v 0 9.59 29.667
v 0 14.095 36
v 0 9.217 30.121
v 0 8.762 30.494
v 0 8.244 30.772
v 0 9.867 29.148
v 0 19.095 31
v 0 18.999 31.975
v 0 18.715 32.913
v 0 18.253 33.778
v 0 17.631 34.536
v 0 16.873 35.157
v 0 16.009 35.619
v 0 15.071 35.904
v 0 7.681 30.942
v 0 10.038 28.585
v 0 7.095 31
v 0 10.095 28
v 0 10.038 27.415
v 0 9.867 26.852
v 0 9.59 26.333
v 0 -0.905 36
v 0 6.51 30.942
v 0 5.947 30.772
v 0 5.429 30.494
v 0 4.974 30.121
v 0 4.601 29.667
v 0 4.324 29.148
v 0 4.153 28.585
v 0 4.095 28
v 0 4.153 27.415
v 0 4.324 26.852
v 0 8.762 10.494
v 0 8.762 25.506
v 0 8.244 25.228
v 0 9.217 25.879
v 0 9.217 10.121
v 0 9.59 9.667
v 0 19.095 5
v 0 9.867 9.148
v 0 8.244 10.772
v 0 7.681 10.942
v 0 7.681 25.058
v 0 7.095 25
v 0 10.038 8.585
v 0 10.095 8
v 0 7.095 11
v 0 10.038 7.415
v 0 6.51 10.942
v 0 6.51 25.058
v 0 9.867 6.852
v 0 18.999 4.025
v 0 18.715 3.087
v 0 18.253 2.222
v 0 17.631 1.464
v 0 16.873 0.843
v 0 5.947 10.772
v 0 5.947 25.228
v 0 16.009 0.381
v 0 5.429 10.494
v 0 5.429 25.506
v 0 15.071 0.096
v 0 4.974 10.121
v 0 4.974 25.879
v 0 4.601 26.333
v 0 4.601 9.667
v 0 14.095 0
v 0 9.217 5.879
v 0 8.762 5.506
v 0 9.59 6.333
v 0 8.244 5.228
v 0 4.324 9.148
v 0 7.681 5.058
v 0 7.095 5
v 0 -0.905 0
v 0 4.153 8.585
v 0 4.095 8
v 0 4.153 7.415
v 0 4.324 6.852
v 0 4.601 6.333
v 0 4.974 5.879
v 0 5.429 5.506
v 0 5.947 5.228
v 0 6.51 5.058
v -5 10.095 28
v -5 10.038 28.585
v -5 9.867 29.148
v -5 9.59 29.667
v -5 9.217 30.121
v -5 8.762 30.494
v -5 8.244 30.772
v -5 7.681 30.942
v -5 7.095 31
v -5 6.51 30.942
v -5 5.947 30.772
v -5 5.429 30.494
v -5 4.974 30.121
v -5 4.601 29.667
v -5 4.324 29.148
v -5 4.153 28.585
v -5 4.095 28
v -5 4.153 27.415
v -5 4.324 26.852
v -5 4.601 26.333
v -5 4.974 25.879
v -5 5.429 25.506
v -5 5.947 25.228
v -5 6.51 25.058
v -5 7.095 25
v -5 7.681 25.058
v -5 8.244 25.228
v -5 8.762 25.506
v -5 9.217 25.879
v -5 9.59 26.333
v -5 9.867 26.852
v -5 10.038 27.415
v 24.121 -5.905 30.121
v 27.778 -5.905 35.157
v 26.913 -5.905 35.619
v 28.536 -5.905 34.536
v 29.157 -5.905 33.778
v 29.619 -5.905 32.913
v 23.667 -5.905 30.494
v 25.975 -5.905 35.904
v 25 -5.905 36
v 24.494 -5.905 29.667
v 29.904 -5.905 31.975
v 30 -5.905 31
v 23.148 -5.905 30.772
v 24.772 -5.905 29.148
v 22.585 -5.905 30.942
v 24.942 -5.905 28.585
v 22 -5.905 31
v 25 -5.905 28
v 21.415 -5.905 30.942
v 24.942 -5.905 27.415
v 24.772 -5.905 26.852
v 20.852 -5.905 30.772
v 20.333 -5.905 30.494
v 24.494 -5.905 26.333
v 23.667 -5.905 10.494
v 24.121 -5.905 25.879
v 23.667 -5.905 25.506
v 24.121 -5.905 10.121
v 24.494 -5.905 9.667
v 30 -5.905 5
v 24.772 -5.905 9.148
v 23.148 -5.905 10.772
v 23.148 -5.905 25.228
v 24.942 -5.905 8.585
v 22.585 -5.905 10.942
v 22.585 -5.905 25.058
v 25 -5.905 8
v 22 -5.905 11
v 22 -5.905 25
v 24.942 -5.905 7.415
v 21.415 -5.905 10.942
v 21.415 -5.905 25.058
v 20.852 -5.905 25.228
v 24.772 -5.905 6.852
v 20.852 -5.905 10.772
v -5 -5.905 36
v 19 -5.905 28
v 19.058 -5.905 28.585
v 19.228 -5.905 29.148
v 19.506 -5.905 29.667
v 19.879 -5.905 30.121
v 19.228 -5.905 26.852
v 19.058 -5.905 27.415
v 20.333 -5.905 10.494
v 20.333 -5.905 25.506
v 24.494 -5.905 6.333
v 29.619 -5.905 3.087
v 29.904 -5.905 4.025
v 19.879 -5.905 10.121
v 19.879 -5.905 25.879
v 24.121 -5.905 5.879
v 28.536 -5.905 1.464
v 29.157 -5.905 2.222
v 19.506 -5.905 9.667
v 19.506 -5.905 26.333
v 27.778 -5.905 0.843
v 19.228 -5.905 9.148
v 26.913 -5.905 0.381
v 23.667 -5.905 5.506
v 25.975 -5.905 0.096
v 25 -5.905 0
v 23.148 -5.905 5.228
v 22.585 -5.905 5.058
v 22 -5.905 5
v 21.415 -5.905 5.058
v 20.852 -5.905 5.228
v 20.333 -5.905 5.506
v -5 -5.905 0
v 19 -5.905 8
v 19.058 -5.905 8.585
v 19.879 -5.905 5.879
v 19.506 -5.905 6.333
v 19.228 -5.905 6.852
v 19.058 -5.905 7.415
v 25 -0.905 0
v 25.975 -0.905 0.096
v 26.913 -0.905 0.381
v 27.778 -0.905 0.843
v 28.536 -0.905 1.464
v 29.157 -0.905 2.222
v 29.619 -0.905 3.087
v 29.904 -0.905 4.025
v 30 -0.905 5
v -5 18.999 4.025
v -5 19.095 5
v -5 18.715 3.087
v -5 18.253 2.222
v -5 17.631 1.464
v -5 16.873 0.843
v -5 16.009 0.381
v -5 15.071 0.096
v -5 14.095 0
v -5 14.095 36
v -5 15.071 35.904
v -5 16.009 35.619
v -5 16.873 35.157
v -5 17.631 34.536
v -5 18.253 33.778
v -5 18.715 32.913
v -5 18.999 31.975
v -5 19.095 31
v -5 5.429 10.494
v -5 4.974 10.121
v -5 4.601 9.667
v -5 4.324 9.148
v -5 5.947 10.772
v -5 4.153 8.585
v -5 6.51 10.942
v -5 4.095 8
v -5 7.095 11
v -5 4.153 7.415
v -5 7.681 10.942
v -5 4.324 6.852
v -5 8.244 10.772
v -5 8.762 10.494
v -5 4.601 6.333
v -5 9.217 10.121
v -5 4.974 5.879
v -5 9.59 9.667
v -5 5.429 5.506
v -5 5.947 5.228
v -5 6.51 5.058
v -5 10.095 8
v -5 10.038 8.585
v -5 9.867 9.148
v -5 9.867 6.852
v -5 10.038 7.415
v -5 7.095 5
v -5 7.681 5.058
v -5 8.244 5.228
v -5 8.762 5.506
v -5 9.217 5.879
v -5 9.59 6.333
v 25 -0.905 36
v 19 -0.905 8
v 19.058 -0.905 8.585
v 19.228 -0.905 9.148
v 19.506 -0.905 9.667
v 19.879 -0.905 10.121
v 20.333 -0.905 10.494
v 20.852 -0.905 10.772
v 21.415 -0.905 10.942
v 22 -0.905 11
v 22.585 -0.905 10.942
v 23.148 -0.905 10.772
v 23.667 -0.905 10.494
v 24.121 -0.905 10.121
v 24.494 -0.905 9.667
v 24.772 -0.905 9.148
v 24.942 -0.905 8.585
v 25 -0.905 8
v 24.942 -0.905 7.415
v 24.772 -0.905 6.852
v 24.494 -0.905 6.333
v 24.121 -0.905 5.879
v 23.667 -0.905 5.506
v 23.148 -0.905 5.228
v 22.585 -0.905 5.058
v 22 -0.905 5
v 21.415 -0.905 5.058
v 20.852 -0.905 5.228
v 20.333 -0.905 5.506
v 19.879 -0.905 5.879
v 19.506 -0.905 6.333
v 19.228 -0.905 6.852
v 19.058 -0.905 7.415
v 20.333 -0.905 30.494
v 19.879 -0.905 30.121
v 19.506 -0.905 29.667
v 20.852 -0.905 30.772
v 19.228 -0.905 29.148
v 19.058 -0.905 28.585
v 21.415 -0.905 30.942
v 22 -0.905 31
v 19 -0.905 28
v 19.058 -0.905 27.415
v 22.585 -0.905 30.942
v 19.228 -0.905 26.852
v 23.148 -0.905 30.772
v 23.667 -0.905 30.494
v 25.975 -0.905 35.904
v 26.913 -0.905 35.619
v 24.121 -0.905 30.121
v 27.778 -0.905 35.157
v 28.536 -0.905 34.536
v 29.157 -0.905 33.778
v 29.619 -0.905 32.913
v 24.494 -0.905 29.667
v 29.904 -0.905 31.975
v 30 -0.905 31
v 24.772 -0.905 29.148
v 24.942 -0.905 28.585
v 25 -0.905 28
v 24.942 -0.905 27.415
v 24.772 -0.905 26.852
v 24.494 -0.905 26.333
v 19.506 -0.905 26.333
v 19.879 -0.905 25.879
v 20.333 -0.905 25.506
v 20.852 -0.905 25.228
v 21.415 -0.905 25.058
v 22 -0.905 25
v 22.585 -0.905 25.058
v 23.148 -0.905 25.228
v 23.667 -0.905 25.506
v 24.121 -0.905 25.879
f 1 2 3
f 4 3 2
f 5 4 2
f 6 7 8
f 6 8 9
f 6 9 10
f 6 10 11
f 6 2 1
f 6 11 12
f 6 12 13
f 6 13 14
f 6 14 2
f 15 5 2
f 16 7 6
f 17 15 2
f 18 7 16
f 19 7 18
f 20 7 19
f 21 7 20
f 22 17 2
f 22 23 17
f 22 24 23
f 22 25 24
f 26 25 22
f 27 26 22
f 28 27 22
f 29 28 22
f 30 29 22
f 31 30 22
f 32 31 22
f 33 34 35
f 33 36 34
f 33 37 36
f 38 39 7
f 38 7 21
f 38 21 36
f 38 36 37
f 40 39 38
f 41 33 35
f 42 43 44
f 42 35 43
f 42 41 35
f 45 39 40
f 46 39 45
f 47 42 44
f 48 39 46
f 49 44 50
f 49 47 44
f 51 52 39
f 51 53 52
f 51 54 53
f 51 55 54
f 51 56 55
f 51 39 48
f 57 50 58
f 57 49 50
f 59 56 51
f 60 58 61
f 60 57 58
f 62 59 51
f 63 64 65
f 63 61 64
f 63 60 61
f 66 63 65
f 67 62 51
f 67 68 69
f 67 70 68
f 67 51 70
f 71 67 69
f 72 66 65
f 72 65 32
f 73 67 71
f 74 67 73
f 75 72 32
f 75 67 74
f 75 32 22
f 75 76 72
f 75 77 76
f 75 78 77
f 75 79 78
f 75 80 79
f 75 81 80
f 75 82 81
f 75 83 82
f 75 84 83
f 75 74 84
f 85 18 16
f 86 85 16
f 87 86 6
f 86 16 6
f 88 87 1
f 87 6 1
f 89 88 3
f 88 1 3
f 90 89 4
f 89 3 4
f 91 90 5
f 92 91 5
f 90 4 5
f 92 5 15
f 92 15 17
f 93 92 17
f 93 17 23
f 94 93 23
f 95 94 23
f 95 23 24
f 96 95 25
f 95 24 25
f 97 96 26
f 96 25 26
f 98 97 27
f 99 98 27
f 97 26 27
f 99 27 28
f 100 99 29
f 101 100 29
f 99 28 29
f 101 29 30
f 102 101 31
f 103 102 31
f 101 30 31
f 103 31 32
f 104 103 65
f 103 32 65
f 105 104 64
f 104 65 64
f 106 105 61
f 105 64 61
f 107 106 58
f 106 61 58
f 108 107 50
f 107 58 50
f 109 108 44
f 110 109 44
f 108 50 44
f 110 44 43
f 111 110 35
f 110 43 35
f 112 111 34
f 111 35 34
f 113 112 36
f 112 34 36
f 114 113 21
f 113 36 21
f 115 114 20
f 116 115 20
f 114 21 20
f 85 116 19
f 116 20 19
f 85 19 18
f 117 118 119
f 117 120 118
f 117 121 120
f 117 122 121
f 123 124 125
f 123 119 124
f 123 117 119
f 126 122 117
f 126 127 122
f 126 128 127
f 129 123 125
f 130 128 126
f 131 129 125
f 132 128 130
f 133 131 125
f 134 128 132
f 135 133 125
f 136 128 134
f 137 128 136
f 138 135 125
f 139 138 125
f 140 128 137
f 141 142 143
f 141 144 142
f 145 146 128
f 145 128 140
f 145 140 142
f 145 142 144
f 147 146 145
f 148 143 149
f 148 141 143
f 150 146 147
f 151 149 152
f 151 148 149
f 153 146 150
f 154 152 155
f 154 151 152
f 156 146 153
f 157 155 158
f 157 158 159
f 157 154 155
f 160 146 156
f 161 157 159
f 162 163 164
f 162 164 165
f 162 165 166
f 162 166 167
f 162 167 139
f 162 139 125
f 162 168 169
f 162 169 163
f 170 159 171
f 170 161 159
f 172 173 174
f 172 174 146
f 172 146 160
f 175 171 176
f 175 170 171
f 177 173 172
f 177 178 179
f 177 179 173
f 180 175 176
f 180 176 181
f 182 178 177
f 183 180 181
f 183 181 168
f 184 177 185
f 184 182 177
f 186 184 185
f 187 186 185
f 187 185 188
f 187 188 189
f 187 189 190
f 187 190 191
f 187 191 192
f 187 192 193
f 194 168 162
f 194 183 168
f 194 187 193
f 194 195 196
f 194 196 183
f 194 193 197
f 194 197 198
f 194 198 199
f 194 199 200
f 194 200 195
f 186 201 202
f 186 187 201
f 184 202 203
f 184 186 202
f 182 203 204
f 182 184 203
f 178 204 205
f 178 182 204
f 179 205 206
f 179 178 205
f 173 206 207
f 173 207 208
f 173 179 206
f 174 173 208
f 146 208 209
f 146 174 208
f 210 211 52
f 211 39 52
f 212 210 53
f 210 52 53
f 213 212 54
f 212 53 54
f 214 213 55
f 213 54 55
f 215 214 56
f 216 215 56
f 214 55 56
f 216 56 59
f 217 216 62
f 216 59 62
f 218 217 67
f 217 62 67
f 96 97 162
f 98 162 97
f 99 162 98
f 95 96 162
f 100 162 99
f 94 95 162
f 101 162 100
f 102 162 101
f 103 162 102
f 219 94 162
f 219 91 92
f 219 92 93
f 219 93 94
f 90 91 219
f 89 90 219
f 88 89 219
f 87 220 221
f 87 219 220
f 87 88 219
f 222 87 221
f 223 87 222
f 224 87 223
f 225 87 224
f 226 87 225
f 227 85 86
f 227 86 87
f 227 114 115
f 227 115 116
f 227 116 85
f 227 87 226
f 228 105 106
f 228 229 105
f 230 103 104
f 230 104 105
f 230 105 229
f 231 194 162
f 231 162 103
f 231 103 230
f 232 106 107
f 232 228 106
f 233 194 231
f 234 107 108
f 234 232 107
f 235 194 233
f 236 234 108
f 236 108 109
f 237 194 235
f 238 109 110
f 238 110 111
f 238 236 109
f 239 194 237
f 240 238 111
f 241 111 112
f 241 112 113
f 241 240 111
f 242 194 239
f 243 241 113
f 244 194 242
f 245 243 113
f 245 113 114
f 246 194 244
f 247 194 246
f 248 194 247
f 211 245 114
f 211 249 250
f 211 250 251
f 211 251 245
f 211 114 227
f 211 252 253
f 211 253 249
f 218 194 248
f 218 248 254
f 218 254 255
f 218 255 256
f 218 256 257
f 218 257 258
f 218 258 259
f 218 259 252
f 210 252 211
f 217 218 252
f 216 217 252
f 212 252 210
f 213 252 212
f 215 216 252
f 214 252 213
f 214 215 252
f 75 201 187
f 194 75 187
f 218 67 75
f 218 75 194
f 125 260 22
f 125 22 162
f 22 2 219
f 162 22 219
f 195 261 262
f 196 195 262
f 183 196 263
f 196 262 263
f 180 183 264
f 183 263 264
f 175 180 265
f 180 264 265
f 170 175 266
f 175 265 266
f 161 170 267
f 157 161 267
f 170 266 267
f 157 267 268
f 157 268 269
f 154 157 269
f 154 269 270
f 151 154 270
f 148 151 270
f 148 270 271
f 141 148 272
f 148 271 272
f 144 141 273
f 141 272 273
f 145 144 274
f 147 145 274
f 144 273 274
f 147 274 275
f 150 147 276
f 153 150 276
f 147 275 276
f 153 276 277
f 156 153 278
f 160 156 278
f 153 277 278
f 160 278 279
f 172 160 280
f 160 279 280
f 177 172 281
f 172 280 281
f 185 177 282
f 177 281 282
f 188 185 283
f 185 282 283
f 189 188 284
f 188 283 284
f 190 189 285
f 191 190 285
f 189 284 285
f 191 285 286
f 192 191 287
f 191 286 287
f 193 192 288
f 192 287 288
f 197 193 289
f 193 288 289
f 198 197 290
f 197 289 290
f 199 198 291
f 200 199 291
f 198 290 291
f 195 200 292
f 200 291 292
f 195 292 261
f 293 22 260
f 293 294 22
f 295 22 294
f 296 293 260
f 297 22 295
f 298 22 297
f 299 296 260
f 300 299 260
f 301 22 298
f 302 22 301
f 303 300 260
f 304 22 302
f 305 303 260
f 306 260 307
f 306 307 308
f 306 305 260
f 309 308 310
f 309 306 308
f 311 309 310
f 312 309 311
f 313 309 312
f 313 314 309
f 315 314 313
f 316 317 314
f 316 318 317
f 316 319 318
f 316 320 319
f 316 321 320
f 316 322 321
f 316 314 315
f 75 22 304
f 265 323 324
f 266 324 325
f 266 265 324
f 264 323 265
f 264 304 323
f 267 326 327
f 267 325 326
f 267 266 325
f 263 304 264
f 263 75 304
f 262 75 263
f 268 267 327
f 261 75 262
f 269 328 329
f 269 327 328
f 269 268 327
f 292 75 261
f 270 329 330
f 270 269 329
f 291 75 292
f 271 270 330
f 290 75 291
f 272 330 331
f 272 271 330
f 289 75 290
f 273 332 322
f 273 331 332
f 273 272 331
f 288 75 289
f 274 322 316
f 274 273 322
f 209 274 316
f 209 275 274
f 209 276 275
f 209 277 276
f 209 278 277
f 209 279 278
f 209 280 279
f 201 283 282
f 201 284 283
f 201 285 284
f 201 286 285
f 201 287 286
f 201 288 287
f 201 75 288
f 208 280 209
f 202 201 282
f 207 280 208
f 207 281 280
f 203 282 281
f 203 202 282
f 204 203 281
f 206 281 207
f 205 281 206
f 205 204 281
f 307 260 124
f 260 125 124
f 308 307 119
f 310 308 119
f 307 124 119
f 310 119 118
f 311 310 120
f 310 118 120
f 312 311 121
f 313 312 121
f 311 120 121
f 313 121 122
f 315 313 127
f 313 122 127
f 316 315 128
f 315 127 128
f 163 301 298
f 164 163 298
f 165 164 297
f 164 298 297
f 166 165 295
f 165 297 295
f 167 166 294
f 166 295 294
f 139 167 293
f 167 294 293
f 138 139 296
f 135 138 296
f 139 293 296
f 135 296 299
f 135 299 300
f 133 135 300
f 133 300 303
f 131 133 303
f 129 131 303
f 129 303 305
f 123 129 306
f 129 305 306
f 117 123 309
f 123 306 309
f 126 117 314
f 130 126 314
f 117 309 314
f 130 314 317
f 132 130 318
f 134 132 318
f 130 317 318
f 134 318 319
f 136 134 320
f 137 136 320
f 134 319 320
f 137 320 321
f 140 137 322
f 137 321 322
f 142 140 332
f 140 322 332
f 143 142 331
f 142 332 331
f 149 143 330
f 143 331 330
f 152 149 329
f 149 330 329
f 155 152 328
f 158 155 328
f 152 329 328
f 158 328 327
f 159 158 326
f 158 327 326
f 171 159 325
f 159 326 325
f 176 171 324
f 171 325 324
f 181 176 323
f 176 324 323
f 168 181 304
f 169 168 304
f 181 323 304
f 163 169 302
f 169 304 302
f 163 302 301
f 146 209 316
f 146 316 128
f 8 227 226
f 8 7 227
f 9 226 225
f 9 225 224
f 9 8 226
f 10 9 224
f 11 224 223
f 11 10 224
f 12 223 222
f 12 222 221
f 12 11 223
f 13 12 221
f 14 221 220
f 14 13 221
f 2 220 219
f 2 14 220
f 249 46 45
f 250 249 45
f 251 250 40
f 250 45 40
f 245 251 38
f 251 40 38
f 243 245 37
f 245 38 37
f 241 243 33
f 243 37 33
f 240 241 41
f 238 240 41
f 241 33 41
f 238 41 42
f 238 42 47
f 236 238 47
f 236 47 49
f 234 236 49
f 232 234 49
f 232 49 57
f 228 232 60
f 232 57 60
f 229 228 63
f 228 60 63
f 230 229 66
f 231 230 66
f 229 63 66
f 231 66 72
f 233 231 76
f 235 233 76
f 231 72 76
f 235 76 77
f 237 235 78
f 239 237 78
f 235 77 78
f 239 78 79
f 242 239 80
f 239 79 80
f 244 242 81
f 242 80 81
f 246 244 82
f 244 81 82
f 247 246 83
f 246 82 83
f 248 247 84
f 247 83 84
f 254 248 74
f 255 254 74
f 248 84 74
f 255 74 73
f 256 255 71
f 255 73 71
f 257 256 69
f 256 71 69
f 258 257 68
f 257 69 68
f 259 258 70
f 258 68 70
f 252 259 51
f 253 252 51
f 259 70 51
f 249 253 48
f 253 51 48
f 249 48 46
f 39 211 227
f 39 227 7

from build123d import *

# Parameters (mm, degrees)
BOSS_EXTRUDE1_DEPTH = 36
SKETCH2_R           = 3
CUT_EXTRUDE1_DEPTH  = 5
SKETCH3_R           = 3
CUT_EXTRUDE2_DEPTH  = 5
FILLET1_R           = 5


with BuildPart() as part:
    # Sketch1 → Boss-Extrude1 (new body)
    with BuildSketch(Plane.XY):
        Polygon((0, 19.095465902), (0, -0.904534098), (30, -0.904534098), (30, -5.904534098), (-5, -5.904534098), (-5, 19.095465902), align=None)
    extrude(amount=BOSS_EXTRUDE1_DEPTH)

    # Sketch2 → Cut-Extrude1 (cut)
    with BuildSketch(Plane(origin=(0, -0.904534098, 0), x_dir=(1, 0, 0), z_dir=(0, 1, 0))):
        with Locations(Location((22, -8, 0), (0, 0, 180))):
            Circle(SKETCH2_R)
        with Locations(Location((22, -28, 0), (0, 0, 180))):
            Circle(SKETCH2_R)
    extrude(amount=-CUT_EXTRUDE1_DEPTH, mode=Mode.SUBTRACT)

    # Sketch3 → Cut-Extrude2 (cut)
    with BuildSketch(Plane(origin=(0, 0, 0), x_dir=(0, 0, -1), z_dir=(1, 0, 0))):
        with Locations(Location((-28, 7.095465902, 0), (0, 0, 90))):
            Circle(SKETCH3_R)
        with Locations(Location((-8, 7.095465902, 0), (0, 0, 90))):
            Circle(SKETCH3_R)
    extrude(amount=-CUT_EXTRUDE2_DEPTH, mode=Mode.SUBTRACT)

    # Fillet1
    fillet1_edges = [part.edges().sort_by_distance(p)[0] for p in [
        (30, -3.404534098, 36),
        (-2.5, 19.095465902, 36),
        (30, -3.404534098, 0),
        (-2.5, 19.095465902, 0),
    ]]
    fillet(fillet1_edges, radius=FILLET1_R)


solid = part.part
